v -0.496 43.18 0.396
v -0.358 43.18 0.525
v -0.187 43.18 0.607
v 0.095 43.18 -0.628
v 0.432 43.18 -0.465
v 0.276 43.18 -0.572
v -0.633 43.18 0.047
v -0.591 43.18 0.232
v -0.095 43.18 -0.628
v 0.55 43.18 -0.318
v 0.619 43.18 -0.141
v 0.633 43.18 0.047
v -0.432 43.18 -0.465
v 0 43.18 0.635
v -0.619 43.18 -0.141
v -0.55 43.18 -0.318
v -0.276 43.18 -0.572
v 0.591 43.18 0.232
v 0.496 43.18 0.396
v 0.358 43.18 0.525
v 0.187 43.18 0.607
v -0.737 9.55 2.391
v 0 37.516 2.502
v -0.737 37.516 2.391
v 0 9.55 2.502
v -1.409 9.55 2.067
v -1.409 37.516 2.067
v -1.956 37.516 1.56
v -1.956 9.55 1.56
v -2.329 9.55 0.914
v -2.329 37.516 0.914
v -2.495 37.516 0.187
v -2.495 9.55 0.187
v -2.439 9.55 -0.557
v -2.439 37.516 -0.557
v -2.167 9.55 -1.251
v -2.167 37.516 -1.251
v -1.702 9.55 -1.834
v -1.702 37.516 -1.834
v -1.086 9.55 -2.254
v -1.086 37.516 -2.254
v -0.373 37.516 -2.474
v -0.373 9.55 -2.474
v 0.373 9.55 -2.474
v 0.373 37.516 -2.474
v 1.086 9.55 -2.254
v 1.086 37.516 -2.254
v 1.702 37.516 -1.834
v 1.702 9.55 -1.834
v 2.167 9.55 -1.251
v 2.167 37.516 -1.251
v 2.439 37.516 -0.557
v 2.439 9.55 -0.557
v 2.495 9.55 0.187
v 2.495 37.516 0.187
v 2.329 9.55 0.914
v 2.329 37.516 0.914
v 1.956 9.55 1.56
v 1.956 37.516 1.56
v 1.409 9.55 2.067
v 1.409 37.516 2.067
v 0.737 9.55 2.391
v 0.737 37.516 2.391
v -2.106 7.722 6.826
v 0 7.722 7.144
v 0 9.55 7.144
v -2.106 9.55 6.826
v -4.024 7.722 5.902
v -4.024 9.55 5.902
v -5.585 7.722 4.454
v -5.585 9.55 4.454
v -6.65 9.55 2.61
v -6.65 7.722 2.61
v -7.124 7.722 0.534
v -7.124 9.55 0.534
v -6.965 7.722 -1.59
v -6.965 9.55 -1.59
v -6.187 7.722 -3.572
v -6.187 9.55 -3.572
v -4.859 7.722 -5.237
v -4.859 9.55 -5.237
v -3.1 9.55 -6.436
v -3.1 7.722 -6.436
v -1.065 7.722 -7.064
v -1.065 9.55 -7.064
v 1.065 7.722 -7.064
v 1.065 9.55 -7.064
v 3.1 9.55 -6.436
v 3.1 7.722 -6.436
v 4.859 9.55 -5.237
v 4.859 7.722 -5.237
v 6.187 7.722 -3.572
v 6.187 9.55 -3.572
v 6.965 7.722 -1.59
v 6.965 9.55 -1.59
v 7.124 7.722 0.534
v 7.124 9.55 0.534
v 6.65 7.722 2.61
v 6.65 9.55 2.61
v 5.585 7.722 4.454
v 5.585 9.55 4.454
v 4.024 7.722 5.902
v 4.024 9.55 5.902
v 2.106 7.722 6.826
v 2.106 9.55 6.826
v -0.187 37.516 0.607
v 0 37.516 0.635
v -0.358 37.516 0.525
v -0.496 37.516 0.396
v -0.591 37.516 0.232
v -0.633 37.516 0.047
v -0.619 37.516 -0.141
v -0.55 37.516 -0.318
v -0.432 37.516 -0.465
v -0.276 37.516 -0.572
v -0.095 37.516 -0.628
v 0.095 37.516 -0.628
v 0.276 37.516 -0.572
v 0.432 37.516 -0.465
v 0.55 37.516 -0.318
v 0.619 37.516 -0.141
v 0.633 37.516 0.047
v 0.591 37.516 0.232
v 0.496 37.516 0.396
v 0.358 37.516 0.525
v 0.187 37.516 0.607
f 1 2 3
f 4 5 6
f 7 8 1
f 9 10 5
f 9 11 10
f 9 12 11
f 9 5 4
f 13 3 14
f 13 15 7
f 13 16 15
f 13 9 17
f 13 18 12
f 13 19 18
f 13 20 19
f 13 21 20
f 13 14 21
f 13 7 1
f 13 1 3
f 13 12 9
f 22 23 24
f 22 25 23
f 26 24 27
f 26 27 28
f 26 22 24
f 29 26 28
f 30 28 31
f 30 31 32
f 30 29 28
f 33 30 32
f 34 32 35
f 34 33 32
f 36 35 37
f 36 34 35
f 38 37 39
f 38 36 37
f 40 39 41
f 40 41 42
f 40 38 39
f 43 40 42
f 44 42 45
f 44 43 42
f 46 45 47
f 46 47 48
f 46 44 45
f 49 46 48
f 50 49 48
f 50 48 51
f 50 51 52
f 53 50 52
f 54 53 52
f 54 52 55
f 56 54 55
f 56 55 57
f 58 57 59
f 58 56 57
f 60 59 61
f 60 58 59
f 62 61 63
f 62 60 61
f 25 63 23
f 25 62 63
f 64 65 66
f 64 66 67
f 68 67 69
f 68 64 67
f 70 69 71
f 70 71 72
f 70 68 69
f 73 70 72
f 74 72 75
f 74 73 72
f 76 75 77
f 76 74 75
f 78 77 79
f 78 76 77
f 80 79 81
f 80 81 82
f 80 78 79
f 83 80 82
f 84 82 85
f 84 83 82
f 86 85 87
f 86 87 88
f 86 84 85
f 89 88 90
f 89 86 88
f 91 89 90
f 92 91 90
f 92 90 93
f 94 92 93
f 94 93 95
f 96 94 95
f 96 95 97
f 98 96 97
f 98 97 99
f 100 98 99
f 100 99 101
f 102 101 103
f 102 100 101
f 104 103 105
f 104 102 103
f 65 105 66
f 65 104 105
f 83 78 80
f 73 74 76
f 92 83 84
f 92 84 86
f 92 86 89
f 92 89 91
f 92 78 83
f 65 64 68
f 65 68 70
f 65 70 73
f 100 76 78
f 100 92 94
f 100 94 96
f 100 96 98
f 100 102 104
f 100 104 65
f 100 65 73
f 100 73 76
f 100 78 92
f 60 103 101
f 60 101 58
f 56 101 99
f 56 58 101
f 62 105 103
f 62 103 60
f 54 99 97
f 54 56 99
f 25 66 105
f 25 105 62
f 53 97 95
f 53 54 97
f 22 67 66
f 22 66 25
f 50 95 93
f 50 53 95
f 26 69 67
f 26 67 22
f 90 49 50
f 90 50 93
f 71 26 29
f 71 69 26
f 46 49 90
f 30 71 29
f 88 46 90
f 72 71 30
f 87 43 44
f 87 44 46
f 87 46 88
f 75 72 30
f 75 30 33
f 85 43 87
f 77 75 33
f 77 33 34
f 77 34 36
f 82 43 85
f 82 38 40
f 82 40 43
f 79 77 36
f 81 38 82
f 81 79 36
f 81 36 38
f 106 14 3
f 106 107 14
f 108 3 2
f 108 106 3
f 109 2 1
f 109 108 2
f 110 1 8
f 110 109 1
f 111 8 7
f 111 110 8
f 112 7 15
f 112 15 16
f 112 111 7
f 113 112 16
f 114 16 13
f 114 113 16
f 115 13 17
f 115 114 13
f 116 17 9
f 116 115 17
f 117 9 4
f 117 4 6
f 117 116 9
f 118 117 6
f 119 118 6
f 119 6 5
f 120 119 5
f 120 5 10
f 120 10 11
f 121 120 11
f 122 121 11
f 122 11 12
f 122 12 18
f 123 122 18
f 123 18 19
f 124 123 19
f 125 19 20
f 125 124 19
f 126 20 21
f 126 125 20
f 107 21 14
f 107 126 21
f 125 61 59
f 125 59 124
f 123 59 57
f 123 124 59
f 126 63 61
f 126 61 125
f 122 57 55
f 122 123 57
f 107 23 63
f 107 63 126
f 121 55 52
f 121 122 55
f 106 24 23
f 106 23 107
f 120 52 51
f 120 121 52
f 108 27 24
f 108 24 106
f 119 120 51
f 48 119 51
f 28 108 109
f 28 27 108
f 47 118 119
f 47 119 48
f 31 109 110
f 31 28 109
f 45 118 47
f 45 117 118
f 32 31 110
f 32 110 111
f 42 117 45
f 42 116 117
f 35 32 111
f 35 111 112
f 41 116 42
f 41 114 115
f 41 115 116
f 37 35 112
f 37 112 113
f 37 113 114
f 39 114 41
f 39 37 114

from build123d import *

# Parameters (mm, degrees)
F2_R     = 9.525
F3_DEPTH = 7.7216


with BuildPart() as f1:
    # F0 (on Right) → F1 (revolve)
    with BuildSketch(Plane.YZ):
        Polygon((0, 7.14375), (0, 0), (43.18, 0), (43.18, 0.635), (37.5158, 0.635), (37.5158, 2.5019), (9.5504, 2.5019), (9.5504, 7.14375), align=None)
    revolve(axis=Axis((0, -1.133929, 0), (0, -1, 0)))

    # F2 (on face) → F3 (cut)
    with BuildSketch(Plane.XZ):
        Circle(F2_R)
    extrude(amount=-F3_DEPTH, mode=Mode.SUBTRACT)


solid = f1.part
